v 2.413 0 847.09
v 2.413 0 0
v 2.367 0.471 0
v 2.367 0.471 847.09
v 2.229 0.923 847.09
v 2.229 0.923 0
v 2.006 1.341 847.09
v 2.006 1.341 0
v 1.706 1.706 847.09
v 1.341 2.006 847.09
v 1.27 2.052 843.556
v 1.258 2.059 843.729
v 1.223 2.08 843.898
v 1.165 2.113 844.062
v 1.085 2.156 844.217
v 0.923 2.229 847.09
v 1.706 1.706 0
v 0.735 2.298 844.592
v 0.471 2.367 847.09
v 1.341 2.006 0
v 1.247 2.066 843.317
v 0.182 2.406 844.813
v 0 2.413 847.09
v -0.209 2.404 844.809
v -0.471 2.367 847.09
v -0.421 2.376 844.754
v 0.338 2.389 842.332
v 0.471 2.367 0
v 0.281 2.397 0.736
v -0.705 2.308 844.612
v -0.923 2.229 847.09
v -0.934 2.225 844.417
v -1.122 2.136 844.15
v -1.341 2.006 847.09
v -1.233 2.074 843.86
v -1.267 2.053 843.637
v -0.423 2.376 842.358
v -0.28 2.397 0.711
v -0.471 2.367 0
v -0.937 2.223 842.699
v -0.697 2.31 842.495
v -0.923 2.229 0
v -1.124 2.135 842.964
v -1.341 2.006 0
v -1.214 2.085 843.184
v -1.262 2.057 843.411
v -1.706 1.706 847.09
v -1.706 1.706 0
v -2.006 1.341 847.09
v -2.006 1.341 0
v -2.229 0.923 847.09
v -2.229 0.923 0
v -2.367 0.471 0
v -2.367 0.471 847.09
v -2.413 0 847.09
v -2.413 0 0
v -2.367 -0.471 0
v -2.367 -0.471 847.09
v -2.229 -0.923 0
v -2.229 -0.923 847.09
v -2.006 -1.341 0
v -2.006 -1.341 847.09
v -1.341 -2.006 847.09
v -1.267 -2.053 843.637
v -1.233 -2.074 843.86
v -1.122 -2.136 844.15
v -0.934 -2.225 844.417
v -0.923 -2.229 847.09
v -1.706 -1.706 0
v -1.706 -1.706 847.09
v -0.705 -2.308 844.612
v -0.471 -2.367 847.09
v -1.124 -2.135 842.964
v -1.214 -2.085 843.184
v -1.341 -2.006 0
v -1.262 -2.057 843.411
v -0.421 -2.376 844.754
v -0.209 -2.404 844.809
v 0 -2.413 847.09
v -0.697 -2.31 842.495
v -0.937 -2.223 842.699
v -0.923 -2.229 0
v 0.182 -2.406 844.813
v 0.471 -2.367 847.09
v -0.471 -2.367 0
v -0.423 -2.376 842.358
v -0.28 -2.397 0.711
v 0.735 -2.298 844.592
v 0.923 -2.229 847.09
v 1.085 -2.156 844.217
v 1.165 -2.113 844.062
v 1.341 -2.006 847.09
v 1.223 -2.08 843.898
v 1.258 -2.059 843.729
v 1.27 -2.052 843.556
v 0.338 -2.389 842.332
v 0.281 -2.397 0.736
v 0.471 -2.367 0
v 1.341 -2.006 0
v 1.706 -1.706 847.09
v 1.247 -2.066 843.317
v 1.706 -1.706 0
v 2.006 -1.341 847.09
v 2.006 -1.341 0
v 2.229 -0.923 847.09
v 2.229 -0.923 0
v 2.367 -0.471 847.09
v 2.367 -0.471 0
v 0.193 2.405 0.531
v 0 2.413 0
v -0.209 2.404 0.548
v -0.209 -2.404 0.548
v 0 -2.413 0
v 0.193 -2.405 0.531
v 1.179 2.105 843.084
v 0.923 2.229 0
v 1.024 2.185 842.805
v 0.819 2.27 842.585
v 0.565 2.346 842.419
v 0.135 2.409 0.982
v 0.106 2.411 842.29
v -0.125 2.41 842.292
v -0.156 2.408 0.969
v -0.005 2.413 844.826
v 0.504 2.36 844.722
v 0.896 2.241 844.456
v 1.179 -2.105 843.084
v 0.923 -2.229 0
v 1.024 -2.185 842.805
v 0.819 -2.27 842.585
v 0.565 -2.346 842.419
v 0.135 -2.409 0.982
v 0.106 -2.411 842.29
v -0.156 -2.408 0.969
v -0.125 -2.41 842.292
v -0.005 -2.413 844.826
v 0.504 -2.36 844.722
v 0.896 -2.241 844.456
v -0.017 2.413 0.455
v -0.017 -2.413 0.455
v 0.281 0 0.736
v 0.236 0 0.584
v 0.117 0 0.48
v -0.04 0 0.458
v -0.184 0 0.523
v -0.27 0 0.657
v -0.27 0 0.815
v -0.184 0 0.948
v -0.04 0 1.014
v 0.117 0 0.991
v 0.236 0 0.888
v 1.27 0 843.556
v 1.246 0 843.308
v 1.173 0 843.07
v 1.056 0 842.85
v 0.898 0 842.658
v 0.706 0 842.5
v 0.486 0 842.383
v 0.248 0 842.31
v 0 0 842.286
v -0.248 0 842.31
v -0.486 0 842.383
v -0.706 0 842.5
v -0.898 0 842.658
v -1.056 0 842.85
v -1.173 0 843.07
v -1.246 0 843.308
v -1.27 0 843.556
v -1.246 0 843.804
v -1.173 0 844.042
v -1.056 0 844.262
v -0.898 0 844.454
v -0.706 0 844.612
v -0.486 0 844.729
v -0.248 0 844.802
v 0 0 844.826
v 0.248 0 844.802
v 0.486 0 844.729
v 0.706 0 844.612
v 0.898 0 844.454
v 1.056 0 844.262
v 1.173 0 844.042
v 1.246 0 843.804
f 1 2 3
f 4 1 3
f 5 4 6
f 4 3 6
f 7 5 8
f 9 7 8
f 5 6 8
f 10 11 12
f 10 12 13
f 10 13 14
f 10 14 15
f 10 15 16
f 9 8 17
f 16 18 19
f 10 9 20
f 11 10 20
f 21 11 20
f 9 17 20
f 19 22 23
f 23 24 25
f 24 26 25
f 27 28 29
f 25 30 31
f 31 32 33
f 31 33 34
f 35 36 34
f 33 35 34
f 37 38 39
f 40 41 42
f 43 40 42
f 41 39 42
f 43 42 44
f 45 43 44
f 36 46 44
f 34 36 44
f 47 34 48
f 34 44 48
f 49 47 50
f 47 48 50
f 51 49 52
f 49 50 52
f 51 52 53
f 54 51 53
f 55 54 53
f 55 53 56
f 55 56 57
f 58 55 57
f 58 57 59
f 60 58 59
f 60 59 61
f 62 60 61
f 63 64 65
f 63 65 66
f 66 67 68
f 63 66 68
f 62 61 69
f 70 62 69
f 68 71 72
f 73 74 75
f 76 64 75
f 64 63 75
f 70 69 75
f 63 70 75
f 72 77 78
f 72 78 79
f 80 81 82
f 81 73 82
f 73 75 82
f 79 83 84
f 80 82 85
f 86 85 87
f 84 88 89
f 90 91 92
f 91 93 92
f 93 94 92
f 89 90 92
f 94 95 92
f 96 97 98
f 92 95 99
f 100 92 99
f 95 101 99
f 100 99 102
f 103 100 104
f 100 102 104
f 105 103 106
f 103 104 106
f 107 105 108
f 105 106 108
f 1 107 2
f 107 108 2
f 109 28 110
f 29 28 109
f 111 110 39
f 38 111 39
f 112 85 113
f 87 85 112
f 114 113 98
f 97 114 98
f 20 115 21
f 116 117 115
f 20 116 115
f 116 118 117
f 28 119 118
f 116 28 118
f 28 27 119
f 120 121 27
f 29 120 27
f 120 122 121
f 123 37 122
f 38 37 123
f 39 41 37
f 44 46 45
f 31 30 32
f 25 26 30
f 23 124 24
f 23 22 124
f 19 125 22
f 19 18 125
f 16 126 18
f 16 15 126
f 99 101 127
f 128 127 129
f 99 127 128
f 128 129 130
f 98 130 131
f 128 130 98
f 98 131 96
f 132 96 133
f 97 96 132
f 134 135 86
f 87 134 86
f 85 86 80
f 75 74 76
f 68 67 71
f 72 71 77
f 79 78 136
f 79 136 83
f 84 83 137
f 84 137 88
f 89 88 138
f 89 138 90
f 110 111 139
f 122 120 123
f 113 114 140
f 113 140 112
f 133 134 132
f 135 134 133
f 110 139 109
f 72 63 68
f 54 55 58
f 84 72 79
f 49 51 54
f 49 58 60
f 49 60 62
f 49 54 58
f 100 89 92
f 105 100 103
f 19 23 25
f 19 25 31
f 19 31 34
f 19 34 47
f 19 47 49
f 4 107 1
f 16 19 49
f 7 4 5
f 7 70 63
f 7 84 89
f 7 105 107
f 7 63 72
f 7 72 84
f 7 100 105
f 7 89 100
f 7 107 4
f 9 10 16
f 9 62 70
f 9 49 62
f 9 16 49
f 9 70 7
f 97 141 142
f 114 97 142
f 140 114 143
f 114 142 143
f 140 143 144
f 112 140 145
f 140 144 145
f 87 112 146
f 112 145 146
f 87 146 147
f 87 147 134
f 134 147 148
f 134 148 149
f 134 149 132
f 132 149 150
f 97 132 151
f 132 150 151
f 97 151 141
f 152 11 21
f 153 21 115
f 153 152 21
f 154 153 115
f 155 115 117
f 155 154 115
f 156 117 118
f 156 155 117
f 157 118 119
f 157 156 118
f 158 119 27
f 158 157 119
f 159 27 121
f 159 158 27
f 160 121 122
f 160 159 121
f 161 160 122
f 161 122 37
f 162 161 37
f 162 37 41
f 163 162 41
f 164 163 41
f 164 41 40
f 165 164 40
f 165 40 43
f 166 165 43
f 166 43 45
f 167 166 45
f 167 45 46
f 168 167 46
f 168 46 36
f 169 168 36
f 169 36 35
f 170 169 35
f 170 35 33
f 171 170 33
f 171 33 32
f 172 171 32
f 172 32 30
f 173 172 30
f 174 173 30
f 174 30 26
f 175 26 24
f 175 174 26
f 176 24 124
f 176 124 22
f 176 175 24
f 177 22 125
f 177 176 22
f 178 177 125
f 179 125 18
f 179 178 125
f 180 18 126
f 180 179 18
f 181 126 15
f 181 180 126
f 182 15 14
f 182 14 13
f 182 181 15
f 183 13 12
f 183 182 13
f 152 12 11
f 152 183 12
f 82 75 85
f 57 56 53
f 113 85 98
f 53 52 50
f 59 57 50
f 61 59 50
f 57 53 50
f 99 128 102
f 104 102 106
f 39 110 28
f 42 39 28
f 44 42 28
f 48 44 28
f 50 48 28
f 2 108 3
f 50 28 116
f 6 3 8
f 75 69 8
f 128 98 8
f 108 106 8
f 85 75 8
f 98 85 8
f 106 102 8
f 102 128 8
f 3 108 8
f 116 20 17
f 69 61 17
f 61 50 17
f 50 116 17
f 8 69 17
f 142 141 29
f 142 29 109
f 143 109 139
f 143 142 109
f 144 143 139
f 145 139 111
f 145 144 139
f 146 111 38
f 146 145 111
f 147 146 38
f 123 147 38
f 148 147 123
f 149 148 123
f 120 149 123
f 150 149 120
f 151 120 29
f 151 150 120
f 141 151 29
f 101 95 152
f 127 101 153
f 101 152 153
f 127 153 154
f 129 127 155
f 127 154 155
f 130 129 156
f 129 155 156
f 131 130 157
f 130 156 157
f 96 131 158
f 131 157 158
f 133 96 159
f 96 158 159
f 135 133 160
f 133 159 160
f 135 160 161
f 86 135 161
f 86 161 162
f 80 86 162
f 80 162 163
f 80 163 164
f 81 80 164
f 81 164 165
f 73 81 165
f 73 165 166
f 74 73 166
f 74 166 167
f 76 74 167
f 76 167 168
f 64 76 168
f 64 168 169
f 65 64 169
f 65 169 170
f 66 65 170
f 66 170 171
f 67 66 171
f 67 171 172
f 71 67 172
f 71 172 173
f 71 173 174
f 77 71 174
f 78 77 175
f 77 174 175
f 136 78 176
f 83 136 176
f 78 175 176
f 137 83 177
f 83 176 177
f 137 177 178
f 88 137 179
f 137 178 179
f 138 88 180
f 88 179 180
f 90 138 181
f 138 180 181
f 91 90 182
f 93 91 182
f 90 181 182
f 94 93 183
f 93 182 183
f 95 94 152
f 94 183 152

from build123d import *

# Parameters (mm, degrees)
SKETCH1_R               = 2.413
BOSS_EXTRUDE1_DEPTH     = 847.09
SKETCH2_R               = 1.27
SKETCH2_R_2             = 0.28089526
CUT_EXTRUDE1_DEPTH      = 3.413
CUT_EXTRUDE1_DEPTH_BACK = 3.413


with BuildPart() as part:
    # Sketch1 → Boss-Extrude1 (new body)
    with BuildSketch(Plane.XY):
        Circle(SKETCH1_R)
    extrude(amount=BOSS_EXTRUDE1_DEPTH)

    # Sketch2 → Cut-Extrude1 (cut, two sides)
    with BuildSketch(Plane(origin=(0, 0, 0), x_dir=(1, 0, 0), z_dir=(0, 1, 0))) as cut_extrude1_sk:
        with Locations((0, -843.555959397)):
            Circle(SKETCH2_R)
        with Locations((0, -0.735765283)):
            Circle(SKETCH2_R_2)
    extrude(amount=CUT_EXTRUDE1_DEPTH, mode=Mode.SUBTRACT)
    extrude(cut_extrude1_sk.sketch, amount=-CUT_EXTRUDE1_DEPTH_BACK, mode=Mode.SUBTRACT)


solid = part.part
